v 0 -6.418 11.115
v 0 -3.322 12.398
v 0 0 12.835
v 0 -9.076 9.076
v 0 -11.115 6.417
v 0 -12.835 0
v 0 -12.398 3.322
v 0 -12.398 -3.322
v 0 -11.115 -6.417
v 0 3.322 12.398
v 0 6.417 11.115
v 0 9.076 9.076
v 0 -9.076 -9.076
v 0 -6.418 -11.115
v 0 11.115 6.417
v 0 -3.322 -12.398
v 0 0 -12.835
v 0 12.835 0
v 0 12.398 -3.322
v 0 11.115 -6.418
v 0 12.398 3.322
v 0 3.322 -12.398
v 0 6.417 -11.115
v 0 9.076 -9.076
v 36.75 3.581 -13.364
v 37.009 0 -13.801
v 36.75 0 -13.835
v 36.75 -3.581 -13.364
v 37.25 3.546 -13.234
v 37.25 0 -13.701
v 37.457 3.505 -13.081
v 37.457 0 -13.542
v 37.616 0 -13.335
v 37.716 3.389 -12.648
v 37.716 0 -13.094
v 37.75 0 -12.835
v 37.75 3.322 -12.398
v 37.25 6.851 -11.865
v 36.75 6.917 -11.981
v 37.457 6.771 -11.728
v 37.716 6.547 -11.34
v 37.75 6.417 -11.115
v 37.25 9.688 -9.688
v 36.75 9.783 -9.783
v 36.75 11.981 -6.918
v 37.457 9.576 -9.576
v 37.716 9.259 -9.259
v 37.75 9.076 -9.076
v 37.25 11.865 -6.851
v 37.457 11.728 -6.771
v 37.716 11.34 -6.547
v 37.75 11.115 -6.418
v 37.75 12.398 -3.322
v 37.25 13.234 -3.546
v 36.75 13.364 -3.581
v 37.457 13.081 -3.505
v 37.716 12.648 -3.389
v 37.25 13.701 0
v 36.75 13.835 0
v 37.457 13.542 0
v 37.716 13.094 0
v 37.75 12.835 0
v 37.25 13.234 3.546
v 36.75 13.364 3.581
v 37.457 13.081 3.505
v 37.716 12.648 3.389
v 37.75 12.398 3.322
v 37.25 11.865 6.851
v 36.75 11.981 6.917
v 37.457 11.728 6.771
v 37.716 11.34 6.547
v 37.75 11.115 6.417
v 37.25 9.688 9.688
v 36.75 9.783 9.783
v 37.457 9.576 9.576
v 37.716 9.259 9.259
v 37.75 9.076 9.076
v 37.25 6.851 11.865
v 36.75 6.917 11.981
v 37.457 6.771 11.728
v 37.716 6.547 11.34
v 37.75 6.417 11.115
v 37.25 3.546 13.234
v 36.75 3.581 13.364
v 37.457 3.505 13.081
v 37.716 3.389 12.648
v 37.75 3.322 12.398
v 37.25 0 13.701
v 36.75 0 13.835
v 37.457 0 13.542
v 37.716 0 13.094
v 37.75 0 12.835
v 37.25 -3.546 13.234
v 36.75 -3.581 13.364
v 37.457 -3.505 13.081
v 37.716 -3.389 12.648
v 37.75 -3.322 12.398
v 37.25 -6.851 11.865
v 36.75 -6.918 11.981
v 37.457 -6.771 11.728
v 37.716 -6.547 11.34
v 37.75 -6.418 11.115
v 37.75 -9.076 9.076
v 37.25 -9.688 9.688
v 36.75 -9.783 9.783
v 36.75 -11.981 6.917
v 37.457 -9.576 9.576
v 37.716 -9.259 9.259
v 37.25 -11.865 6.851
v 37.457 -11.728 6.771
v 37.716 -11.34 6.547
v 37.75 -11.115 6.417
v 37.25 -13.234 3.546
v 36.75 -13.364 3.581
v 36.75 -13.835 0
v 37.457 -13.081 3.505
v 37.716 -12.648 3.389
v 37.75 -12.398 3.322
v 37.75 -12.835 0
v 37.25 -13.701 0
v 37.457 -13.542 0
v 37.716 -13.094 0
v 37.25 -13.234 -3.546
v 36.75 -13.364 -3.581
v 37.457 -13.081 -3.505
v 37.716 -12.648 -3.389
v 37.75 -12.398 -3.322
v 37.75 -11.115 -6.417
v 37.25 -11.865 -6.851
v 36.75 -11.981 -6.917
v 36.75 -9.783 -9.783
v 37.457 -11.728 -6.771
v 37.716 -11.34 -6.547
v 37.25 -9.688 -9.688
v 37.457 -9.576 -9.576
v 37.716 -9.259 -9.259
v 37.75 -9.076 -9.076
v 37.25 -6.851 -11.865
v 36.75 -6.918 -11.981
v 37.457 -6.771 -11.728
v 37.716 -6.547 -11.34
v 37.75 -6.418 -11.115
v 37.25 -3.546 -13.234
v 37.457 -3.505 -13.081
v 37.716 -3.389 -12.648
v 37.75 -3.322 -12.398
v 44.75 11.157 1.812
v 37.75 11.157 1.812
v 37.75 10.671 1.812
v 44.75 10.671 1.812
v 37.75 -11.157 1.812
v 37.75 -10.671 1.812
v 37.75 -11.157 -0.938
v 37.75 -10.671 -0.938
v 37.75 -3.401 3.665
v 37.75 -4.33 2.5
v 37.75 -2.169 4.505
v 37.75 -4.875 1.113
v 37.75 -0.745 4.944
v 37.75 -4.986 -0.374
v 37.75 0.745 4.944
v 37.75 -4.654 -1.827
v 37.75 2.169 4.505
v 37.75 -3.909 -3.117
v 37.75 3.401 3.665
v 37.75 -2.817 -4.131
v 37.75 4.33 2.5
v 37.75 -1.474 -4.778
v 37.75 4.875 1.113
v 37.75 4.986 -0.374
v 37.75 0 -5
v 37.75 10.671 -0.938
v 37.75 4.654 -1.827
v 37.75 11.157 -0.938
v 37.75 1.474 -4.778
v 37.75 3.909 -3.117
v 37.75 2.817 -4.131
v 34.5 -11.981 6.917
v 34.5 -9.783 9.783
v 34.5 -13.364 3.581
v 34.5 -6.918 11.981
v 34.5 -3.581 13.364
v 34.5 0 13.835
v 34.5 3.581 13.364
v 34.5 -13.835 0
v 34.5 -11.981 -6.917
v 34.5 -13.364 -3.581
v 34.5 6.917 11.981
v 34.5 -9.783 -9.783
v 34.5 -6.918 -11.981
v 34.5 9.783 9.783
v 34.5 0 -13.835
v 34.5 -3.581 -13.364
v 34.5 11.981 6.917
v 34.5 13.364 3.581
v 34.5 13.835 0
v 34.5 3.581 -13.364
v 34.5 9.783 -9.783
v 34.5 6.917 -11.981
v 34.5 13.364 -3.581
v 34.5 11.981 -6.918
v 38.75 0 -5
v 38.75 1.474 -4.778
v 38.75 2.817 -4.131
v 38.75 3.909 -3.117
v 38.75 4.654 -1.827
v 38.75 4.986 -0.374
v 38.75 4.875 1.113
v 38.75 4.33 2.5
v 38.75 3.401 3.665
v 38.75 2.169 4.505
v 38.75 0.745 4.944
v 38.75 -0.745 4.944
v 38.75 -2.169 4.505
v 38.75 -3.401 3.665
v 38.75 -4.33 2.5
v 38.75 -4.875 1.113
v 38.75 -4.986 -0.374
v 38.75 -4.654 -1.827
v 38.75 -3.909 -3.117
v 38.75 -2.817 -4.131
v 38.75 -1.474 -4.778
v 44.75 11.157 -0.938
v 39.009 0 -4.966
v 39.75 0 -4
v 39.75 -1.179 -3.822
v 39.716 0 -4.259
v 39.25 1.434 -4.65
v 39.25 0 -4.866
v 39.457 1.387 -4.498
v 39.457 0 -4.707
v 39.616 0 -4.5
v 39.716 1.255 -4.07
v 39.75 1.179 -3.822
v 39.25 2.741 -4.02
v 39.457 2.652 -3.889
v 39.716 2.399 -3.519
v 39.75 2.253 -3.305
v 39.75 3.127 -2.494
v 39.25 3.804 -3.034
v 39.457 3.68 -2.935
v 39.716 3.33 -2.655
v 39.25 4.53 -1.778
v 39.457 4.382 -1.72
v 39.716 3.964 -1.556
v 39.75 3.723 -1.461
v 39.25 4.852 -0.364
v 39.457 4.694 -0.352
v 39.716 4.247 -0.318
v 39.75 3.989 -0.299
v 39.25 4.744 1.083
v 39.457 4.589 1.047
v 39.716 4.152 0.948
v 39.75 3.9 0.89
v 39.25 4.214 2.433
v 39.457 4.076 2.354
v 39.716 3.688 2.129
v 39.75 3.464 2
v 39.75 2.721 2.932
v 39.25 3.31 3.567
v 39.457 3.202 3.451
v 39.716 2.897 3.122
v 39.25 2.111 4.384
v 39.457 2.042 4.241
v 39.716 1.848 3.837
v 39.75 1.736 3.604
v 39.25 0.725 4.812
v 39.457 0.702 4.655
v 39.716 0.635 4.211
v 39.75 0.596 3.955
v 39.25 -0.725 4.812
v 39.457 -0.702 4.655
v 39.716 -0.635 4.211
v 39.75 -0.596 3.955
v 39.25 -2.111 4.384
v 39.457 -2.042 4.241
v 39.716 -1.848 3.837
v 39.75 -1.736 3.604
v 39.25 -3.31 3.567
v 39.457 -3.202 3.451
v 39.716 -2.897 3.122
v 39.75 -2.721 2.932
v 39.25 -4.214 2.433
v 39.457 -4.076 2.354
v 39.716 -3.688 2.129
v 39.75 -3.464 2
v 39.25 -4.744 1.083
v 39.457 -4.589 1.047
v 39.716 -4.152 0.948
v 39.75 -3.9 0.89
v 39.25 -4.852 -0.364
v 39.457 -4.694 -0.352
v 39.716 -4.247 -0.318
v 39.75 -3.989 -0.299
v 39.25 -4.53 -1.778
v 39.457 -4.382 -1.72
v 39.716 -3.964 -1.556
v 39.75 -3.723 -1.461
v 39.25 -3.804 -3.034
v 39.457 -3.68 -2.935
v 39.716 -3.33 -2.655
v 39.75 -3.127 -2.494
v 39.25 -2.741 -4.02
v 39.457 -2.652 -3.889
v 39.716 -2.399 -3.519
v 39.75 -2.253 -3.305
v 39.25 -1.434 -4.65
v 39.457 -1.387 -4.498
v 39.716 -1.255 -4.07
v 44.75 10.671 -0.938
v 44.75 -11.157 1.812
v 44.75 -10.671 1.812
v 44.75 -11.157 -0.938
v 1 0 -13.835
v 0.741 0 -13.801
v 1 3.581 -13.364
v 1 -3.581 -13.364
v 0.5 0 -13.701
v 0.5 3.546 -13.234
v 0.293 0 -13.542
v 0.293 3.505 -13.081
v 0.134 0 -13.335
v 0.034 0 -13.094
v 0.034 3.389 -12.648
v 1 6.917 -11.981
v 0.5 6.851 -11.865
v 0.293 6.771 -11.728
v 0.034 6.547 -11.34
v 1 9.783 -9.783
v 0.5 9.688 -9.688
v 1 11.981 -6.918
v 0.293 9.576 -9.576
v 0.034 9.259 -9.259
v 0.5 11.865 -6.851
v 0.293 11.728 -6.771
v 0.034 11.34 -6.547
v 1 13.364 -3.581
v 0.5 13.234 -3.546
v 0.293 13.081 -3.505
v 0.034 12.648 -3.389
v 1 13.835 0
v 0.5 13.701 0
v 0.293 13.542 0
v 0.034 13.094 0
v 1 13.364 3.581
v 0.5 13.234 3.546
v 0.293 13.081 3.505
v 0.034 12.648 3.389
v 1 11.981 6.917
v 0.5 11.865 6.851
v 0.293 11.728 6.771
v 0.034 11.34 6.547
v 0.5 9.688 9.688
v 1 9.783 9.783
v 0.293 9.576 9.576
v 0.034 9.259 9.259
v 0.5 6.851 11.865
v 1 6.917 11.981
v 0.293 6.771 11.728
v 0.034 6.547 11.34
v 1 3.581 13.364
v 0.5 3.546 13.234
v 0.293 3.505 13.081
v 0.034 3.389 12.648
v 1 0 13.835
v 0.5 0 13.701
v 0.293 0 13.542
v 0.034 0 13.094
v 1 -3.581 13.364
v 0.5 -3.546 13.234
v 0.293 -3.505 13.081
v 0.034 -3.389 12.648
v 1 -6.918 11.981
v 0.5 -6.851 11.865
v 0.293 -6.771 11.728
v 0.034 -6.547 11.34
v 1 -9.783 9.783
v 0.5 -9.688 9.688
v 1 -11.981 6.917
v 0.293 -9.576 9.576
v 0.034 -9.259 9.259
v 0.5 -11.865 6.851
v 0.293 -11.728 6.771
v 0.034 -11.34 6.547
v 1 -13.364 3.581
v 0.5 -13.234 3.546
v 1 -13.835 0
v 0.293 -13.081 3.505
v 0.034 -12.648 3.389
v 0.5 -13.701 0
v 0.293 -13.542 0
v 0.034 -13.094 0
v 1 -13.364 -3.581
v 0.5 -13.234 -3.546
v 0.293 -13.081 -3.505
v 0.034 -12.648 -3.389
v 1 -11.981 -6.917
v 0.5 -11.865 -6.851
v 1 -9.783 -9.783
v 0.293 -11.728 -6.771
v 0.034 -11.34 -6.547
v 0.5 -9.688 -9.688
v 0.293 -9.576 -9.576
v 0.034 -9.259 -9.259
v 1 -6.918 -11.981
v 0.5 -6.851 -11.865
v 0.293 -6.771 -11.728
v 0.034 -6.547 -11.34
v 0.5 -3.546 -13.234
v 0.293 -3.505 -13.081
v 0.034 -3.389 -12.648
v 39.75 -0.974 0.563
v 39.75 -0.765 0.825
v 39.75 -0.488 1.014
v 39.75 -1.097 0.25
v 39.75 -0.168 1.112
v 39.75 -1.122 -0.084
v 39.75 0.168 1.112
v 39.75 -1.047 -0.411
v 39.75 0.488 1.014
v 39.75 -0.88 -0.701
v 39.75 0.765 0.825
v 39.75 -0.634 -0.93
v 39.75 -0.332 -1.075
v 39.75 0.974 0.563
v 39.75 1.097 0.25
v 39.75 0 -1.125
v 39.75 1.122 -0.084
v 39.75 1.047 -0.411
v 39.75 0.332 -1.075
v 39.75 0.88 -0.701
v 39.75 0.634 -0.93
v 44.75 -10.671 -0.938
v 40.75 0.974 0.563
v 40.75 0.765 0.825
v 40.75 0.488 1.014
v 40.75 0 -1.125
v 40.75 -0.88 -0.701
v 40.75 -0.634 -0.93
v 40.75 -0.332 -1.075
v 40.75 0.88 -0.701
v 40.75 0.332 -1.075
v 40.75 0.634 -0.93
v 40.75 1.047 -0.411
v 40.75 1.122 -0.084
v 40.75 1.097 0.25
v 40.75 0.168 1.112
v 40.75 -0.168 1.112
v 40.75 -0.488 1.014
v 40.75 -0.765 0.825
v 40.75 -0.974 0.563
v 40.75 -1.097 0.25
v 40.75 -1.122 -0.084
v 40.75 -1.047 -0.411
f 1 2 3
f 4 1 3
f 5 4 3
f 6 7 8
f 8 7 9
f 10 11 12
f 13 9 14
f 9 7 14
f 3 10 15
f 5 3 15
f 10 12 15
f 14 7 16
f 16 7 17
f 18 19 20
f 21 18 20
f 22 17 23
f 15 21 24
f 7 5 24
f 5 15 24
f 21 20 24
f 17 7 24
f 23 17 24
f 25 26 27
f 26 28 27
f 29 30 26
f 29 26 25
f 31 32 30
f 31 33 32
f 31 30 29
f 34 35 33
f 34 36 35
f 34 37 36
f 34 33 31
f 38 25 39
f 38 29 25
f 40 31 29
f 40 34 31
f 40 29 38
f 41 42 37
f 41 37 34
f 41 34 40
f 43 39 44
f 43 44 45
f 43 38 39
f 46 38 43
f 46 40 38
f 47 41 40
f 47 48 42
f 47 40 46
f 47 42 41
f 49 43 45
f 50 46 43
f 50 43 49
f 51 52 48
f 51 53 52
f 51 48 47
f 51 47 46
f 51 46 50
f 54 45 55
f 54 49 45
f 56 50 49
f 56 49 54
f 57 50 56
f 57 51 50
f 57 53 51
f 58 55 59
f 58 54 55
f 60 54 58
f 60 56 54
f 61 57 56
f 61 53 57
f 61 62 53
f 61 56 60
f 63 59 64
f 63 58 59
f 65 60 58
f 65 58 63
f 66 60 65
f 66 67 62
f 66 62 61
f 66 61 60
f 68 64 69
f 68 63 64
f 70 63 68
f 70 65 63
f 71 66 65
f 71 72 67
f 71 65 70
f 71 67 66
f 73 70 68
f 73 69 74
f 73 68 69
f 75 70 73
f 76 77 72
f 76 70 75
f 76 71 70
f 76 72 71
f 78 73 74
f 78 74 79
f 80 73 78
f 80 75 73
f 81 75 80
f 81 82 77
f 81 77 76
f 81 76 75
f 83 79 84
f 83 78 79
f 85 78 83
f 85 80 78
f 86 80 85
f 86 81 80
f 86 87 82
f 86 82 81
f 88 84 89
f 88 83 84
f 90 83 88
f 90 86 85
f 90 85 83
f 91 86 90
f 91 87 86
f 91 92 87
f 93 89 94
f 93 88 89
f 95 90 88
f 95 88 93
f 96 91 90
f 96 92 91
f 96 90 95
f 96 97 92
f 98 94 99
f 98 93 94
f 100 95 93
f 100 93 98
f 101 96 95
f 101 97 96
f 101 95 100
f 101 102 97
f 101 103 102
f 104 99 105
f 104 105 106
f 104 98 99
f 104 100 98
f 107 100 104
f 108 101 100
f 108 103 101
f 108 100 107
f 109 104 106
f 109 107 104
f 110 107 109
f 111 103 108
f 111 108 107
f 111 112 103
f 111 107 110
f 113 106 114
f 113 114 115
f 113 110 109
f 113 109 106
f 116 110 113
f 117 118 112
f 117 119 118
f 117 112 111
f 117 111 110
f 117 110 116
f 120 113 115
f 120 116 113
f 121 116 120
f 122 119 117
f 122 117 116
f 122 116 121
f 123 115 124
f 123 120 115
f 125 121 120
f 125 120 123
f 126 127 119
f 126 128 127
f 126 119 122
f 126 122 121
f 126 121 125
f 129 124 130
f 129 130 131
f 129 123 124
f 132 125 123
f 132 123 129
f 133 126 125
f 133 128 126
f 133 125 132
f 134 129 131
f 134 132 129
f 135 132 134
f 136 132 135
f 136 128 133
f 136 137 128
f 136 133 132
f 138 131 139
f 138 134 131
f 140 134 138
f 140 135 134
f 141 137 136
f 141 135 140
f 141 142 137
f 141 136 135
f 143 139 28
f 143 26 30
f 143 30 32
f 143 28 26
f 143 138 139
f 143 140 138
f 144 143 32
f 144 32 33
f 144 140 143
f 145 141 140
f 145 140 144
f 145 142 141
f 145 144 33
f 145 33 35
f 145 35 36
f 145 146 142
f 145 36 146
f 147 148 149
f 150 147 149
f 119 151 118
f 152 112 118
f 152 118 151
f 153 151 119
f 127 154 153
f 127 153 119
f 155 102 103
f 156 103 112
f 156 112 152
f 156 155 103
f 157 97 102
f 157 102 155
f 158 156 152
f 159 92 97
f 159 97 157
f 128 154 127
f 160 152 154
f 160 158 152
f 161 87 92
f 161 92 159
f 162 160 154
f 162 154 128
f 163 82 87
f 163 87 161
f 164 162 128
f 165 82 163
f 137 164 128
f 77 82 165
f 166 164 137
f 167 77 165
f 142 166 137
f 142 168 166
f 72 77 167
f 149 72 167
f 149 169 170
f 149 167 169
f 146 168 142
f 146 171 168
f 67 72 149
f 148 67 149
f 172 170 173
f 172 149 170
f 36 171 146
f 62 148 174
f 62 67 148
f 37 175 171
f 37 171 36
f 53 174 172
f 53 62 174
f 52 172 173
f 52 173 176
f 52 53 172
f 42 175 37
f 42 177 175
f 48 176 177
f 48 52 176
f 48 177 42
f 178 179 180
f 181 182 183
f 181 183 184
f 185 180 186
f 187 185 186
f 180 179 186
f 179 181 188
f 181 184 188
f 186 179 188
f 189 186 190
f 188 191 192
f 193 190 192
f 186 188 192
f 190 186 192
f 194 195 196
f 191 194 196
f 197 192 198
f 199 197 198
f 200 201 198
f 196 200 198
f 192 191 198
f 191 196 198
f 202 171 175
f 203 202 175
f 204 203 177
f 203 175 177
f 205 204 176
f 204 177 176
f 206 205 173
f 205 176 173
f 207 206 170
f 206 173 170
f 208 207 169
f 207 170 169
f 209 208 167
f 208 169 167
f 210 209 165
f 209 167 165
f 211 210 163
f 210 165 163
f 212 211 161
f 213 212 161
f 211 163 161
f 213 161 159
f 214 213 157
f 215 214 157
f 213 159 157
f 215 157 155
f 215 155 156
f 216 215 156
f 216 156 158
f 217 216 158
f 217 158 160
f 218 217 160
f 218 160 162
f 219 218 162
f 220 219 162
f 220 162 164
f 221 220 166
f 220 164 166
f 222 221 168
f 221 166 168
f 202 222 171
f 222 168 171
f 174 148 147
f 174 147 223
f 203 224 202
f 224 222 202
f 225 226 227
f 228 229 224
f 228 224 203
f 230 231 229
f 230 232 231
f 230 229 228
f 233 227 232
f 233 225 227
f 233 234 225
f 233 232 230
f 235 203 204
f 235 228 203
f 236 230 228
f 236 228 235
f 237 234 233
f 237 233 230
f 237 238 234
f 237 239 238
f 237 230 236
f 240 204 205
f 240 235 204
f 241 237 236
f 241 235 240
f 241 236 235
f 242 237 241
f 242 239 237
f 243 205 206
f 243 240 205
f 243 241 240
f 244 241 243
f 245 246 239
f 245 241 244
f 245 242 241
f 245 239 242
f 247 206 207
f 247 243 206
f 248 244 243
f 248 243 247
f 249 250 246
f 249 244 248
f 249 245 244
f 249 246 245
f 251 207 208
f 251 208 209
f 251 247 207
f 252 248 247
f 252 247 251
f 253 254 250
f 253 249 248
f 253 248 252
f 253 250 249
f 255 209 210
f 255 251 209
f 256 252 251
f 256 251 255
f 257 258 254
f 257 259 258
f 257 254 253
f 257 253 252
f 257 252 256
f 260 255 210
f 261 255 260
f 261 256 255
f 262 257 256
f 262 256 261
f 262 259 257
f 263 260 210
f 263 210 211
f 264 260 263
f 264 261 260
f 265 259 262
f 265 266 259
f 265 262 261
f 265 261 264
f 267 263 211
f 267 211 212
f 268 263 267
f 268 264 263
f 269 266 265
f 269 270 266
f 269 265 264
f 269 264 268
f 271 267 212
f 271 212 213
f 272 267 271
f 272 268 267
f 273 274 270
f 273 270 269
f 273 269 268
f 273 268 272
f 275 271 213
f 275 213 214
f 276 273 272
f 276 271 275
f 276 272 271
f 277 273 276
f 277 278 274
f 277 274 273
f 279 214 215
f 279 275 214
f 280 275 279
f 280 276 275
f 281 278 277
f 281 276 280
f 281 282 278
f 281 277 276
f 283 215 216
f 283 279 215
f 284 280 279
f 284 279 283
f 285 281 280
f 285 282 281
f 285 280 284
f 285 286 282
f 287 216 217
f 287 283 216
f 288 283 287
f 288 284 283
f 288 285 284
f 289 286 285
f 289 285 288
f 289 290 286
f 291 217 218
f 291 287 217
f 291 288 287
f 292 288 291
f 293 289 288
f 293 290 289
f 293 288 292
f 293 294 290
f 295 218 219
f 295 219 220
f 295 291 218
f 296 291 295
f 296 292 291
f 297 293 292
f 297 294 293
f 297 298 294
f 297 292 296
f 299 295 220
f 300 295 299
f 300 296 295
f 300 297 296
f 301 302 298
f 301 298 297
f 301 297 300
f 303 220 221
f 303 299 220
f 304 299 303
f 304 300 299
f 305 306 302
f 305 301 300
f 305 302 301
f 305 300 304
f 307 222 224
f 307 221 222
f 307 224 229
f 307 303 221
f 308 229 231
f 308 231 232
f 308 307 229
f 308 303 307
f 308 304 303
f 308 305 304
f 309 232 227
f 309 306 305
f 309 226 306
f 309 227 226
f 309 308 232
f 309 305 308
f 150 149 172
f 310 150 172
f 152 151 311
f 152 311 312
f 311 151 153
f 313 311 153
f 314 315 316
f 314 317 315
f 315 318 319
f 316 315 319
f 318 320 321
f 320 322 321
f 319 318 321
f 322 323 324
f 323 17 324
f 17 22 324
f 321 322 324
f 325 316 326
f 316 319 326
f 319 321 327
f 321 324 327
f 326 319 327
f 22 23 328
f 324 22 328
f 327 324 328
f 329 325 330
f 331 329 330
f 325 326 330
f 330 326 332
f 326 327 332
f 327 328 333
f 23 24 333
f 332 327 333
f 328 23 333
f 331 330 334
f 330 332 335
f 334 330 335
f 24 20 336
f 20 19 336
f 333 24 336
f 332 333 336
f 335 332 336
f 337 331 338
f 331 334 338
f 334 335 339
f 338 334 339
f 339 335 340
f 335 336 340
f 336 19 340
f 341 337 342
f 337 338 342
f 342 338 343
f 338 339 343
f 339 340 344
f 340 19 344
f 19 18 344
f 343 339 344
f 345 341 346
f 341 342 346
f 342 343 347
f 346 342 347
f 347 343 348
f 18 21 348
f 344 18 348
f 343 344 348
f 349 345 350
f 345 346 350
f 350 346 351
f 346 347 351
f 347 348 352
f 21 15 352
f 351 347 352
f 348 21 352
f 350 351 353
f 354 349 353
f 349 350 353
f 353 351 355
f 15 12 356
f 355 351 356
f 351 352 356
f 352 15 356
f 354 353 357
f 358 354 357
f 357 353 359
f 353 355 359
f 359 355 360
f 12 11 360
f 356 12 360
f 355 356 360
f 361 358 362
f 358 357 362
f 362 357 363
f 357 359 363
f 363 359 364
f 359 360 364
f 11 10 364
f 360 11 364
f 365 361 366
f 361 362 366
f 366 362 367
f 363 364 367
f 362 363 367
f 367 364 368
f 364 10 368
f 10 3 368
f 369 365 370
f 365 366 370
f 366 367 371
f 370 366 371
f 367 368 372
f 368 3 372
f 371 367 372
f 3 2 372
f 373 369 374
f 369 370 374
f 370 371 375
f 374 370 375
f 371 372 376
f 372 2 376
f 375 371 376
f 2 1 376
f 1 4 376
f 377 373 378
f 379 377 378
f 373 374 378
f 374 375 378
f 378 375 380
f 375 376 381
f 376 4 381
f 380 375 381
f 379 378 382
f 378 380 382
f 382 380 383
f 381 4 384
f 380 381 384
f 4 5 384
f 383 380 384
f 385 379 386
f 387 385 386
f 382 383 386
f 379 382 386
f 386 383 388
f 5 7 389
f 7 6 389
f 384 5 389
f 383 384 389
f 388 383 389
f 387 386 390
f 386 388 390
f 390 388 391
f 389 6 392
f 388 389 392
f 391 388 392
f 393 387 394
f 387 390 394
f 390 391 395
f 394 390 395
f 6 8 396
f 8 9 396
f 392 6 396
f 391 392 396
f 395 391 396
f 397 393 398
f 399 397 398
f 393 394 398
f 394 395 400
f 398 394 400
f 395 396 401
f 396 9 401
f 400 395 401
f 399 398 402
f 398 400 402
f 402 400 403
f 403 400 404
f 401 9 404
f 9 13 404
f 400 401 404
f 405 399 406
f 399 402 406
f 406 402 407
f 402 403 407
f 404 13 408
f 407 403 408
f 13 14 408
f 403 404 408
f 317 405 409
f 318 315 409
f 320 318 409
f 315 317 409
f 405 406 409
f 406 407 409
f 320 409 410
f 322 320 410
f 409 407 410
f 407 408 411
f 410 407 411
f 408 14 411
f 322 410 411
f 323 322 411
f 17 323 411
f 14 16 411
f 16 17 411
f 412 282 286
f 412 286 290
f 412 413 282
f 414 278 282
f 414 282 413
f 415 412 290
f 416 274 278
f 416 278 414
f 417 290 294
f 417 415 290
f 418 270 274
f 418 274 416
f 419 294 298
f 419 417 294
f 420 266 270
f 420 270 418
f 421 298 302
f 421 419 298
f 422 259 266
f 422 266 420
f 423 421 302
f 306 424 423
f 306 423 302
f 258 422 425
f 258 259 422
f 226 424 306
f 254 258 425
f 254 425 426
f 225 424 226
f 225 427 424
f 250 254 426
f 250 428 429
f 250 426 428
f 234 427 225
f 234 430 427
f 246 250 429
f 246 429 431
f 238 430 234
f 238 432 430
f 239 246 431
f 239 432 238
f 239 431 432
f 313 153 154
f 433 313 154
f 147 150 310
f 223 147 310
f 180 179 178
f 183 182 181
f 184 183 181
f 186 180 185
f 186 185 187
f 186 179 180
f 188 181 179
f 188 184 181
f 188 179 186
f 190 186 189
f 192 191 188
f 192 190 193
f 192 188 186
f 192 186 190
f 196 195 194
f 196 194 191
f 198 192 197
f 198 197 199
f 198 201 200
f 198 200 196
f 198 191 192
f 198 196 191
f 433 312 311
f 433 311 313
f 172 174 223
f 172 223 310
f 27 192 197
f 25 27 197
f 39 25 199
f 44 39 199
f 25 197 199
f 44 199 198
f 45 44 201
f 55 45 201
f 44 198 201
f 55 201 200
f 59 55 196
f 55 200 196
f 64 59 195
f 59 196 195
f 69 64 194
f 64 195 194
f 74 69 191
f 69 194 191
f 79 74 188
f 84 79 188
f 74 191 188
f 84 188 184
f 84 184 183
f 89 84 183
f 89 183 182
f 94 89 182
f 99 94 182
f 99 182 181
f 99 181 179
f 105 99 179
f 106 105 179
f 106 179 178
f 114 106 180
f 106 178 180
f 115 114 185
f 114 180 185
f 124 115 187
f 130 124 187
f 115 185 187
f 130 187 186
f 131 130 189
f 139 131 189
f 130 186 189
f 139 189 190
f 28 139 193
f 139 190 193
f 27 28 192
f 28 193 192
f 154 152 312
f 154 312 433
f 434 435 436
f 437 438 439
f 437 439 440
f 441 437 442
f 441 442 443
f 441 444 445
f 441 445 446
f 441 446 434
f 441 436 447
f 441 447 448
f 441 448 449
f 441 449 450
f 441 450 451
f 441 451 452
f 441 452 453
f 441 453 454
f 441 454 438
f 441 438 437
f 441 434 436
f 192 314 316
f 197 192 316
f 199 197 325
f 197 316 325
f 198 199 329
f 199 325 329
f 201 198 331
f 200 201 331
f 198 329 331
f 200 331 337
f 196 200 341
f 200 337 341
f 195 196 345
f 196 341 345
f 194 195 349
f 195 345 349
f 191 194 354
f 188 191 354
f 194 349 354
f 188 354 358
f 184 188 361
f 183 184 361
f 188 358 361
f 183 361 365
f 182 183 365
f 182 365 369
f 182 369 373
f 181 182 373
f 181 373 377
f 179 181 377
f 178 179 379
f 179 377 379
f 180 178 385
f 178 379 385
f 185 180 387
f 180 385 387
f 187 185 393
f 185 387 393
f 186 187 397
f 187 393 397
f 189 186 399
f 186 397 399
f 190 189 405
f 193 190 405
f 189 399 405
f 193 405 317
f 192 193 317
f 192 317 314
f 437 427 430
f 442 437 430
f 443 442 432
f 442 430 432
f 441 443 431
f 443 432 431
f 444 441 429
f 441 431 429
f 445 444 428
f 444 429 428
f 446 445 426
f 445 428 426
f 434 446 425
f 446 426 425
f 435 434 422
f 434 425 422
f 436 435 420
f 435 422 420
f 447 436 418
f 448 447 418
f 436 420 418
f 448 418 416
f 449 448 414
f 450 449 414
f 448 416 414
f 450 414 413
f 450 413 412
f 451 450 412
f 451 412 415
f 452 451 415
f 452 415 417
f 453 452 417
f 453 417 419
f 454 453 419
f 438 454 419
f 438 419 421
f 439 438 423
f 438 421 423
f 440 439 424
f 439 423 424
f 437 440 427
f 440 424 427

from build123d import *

# Parameters (mm, degrees)
SKETCH1_R           = 13.835
BOSS_EXTRUDE1_DEPTH = 34.5
SKETCH2_R           = 13.835
BOSS_EXTRUDE2_DEPTH = 3.25
SKETCH3_R           = 5
BOSS_EXTRUDE3_DEPTH = 2
FILLET1_R           = 1
SKETCH4_R           = 1.125
BOSS_EXTRUDE4_DEPTH = 1
FILLET2_R           = 1
SKETCH5_W           = 2.75
SKETCH5_H           = 0.485466573
BOSS_EXTRUDE5_DEPTH = 7


with BuildPart() as part:
    # Sketch1 → Boss-Extrude1 (new body)
    with BuildSketch(Plane(origin=(0, 0, 0), x_dir=(0, 0, -1), z_dir=(1, 0, 0))):
        Circle(SKETCH1_R)
    extrude(amount=BOSS_EXTRUDE1_DEPTH)

    # Fillet1
    fillet1_edges = [part.edges().sort_by_distance(p)[0] for p in [
        (0, 0, 13.835),
    ]]
    fillet(fillet1_edges, radius=FILLET1_R)


with BuildPart() as body_2:
    # Sketch2 → Boss-Extrude2 (new body)
    with BuildSketch(Plane(origin=(34.5, 0, 0), x_dir=(0, 0, -1), z_dir=(1, 0, 0))):
        Circle(SKETCH2_R)
    extrude(amount=BOSS_EXTRUDE2_DEPTH)

    # Sketch3 → Boss-Extrude3 (add)
    with BuildSketch(Plane(origin=(37.75, 0, 0), x_dir=(0, 0, -1), z_dir=(1, 0, 0))):
        Circle(SKETCH3_R)
    extrude(amount=BOSS_EXTRUDE3_DEPTH)

    # Sketch4 → Boss-Extrude4 (add)
    with BuildSketch(Plane(origin=(39.75, 0, 0), x_dir=(0, 0, -1), z_dir=(1, 0, 0))):
        Circle(SKETCH4_R)
    extrude(amount=BOSS_EXTRUDE4_DEPTH)

    # Fillet2
    fillet2_edges = [body_2.edges().sort_by_distance(p)[0] for p in [
        (37.75, 0, 13.835),
        (39.75, 0, 5),
    ]]
    fillet(fillet2_edges, radius=FILLET2_R)

    # Sketch5 → Boss-Extrude5 (add)
    with BuildSketch(Plane(origin=(37.75, 0, 0), x_dir=(0, 0, -1), z_dir=(1, 0, 0))):
        with Locations((-0.43656989, -10.914149911)):
            Rectangle(SKETCH5_W, SKETCH5_H)
    boss_extrude5 = extrude(amount=BOSS_EXTRUDE5_DEPTH)

    # Mirror1: Boss-Extrude5 across plane
    add(boss_extrude5.mirror(Plane.ZX))


solid = Compound([part.part, body_2.part])
